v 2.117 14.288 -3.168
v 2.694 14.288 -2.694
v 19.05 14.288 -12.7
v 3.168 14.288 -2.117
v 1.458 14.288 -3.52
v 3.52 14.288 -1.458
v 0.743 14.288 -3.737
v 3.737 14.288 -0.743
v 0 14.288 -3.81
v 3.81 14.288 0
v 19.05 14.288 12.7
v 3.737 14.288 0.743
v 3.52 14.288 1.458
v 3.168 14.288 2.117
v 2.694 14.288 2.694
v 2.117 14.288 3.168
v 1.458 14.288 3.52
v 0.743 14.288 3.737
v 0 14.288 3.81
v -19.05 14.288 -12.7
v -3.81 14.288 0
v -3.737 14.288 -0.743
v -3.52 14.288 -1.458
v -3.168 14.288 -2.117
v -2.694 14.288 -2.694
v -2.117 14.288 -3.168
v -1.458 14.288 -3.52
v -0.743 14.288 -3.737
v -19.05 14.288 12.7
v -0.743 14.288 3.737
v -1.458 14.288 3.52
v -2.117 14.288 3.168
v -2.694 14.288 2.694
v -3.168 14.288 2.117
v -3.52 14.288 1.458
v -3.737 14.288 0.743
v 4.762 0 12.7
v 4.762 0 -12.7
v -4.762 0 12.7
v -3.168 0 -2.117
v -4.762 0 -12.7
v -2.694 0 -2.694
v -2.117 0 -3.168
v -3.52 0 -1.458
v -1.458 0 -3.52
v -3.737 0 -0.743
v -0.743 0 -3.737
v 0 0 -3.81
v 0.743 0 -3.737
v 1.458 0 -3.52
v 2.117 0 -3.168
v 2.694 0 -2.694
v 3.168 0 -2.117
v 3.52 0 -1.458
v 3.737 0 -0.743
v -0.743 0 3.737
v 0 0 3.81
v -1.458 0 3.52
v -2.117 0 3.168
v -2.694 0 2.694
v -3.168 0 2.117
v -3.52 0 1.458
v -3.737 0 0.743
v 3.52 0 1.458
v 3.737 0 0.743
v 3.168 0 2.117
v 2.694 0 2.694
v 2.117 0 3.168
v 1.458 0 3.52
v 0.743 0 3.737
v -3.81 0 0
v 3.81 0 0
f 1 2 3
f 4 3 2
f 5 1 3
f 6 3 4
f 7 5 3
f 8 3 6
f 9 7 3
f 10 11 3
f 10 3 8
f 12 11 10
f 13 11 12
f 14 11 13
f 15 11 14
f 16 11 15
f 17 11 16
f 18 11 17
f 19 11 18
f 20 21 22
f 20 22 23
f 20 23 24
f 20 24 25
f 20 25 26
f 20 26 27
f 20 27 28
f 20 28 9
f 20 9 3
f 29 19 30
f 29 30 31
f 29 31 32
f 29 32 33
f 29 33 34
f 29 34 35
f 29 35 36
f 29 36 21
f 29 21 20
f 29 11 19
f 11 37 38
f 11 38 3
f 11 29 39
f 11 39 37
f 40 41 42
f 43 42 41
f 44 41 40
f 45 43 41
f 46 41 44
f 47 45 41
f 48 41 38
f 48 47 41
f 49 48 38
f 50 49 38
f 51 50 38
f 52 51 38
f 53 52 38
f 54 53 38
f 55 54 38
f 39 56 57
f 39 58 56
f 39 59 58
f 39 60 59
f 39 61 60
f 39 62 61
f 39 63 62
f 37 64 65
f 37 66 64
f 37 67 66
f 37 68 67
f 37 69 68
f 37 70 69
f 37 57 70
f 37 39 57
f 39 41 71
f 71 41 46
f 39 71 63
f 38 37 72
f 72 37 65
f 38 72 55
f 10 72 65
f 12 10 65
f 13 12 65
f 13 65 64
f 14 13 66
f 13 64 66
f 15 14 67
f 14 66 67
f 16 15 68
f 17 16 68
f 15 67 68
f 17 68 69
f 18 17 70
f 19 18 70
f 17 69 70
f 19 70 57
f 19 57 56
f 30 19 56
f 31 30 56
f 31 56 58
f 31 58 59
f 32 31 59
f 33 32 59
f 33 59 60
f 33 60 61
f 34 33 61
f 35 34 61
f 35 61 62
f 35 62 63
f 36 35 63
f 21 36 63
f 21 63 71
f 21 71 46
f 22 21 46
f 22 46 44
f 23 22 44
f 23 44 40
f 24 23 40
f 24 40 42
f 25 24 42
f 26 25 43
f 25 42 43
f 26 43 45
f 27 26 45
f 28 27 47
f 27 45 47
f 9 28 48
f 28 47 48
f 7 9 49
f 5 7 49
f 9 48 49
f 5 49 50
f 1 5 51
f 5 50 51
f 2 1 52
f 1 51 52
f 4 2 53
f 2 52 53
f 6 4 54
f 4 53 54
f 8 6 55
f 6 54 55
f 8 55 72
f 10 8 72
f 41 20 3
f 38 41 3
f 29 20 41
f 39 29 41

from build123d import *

# Parameters (mm, degrees)
F1_DEPTH = 12.7
F2_R     = 3.81
F3_DEPTH = 14.2885


with BuildPart() as f1:
    # F0 (on Top) → F1 (new body, symmetric)
    with BuildSketch(Plane.XY):
        Polygon((-19.05, 14.2875), (-4.7625, 0), (4.7625, 0), (19.05, 14.2875), align=None)
    extrude(amount=F1_DEPTH, both=True)

    # F2 (on Front) → F3 (cut, through all)
    with BuildSketch(Plane.XZ):
        Circle(F2_R)
    extrude(amount=-F3_DEPTH, mode=Mode.SUBTRACT)


solid = f1.part
